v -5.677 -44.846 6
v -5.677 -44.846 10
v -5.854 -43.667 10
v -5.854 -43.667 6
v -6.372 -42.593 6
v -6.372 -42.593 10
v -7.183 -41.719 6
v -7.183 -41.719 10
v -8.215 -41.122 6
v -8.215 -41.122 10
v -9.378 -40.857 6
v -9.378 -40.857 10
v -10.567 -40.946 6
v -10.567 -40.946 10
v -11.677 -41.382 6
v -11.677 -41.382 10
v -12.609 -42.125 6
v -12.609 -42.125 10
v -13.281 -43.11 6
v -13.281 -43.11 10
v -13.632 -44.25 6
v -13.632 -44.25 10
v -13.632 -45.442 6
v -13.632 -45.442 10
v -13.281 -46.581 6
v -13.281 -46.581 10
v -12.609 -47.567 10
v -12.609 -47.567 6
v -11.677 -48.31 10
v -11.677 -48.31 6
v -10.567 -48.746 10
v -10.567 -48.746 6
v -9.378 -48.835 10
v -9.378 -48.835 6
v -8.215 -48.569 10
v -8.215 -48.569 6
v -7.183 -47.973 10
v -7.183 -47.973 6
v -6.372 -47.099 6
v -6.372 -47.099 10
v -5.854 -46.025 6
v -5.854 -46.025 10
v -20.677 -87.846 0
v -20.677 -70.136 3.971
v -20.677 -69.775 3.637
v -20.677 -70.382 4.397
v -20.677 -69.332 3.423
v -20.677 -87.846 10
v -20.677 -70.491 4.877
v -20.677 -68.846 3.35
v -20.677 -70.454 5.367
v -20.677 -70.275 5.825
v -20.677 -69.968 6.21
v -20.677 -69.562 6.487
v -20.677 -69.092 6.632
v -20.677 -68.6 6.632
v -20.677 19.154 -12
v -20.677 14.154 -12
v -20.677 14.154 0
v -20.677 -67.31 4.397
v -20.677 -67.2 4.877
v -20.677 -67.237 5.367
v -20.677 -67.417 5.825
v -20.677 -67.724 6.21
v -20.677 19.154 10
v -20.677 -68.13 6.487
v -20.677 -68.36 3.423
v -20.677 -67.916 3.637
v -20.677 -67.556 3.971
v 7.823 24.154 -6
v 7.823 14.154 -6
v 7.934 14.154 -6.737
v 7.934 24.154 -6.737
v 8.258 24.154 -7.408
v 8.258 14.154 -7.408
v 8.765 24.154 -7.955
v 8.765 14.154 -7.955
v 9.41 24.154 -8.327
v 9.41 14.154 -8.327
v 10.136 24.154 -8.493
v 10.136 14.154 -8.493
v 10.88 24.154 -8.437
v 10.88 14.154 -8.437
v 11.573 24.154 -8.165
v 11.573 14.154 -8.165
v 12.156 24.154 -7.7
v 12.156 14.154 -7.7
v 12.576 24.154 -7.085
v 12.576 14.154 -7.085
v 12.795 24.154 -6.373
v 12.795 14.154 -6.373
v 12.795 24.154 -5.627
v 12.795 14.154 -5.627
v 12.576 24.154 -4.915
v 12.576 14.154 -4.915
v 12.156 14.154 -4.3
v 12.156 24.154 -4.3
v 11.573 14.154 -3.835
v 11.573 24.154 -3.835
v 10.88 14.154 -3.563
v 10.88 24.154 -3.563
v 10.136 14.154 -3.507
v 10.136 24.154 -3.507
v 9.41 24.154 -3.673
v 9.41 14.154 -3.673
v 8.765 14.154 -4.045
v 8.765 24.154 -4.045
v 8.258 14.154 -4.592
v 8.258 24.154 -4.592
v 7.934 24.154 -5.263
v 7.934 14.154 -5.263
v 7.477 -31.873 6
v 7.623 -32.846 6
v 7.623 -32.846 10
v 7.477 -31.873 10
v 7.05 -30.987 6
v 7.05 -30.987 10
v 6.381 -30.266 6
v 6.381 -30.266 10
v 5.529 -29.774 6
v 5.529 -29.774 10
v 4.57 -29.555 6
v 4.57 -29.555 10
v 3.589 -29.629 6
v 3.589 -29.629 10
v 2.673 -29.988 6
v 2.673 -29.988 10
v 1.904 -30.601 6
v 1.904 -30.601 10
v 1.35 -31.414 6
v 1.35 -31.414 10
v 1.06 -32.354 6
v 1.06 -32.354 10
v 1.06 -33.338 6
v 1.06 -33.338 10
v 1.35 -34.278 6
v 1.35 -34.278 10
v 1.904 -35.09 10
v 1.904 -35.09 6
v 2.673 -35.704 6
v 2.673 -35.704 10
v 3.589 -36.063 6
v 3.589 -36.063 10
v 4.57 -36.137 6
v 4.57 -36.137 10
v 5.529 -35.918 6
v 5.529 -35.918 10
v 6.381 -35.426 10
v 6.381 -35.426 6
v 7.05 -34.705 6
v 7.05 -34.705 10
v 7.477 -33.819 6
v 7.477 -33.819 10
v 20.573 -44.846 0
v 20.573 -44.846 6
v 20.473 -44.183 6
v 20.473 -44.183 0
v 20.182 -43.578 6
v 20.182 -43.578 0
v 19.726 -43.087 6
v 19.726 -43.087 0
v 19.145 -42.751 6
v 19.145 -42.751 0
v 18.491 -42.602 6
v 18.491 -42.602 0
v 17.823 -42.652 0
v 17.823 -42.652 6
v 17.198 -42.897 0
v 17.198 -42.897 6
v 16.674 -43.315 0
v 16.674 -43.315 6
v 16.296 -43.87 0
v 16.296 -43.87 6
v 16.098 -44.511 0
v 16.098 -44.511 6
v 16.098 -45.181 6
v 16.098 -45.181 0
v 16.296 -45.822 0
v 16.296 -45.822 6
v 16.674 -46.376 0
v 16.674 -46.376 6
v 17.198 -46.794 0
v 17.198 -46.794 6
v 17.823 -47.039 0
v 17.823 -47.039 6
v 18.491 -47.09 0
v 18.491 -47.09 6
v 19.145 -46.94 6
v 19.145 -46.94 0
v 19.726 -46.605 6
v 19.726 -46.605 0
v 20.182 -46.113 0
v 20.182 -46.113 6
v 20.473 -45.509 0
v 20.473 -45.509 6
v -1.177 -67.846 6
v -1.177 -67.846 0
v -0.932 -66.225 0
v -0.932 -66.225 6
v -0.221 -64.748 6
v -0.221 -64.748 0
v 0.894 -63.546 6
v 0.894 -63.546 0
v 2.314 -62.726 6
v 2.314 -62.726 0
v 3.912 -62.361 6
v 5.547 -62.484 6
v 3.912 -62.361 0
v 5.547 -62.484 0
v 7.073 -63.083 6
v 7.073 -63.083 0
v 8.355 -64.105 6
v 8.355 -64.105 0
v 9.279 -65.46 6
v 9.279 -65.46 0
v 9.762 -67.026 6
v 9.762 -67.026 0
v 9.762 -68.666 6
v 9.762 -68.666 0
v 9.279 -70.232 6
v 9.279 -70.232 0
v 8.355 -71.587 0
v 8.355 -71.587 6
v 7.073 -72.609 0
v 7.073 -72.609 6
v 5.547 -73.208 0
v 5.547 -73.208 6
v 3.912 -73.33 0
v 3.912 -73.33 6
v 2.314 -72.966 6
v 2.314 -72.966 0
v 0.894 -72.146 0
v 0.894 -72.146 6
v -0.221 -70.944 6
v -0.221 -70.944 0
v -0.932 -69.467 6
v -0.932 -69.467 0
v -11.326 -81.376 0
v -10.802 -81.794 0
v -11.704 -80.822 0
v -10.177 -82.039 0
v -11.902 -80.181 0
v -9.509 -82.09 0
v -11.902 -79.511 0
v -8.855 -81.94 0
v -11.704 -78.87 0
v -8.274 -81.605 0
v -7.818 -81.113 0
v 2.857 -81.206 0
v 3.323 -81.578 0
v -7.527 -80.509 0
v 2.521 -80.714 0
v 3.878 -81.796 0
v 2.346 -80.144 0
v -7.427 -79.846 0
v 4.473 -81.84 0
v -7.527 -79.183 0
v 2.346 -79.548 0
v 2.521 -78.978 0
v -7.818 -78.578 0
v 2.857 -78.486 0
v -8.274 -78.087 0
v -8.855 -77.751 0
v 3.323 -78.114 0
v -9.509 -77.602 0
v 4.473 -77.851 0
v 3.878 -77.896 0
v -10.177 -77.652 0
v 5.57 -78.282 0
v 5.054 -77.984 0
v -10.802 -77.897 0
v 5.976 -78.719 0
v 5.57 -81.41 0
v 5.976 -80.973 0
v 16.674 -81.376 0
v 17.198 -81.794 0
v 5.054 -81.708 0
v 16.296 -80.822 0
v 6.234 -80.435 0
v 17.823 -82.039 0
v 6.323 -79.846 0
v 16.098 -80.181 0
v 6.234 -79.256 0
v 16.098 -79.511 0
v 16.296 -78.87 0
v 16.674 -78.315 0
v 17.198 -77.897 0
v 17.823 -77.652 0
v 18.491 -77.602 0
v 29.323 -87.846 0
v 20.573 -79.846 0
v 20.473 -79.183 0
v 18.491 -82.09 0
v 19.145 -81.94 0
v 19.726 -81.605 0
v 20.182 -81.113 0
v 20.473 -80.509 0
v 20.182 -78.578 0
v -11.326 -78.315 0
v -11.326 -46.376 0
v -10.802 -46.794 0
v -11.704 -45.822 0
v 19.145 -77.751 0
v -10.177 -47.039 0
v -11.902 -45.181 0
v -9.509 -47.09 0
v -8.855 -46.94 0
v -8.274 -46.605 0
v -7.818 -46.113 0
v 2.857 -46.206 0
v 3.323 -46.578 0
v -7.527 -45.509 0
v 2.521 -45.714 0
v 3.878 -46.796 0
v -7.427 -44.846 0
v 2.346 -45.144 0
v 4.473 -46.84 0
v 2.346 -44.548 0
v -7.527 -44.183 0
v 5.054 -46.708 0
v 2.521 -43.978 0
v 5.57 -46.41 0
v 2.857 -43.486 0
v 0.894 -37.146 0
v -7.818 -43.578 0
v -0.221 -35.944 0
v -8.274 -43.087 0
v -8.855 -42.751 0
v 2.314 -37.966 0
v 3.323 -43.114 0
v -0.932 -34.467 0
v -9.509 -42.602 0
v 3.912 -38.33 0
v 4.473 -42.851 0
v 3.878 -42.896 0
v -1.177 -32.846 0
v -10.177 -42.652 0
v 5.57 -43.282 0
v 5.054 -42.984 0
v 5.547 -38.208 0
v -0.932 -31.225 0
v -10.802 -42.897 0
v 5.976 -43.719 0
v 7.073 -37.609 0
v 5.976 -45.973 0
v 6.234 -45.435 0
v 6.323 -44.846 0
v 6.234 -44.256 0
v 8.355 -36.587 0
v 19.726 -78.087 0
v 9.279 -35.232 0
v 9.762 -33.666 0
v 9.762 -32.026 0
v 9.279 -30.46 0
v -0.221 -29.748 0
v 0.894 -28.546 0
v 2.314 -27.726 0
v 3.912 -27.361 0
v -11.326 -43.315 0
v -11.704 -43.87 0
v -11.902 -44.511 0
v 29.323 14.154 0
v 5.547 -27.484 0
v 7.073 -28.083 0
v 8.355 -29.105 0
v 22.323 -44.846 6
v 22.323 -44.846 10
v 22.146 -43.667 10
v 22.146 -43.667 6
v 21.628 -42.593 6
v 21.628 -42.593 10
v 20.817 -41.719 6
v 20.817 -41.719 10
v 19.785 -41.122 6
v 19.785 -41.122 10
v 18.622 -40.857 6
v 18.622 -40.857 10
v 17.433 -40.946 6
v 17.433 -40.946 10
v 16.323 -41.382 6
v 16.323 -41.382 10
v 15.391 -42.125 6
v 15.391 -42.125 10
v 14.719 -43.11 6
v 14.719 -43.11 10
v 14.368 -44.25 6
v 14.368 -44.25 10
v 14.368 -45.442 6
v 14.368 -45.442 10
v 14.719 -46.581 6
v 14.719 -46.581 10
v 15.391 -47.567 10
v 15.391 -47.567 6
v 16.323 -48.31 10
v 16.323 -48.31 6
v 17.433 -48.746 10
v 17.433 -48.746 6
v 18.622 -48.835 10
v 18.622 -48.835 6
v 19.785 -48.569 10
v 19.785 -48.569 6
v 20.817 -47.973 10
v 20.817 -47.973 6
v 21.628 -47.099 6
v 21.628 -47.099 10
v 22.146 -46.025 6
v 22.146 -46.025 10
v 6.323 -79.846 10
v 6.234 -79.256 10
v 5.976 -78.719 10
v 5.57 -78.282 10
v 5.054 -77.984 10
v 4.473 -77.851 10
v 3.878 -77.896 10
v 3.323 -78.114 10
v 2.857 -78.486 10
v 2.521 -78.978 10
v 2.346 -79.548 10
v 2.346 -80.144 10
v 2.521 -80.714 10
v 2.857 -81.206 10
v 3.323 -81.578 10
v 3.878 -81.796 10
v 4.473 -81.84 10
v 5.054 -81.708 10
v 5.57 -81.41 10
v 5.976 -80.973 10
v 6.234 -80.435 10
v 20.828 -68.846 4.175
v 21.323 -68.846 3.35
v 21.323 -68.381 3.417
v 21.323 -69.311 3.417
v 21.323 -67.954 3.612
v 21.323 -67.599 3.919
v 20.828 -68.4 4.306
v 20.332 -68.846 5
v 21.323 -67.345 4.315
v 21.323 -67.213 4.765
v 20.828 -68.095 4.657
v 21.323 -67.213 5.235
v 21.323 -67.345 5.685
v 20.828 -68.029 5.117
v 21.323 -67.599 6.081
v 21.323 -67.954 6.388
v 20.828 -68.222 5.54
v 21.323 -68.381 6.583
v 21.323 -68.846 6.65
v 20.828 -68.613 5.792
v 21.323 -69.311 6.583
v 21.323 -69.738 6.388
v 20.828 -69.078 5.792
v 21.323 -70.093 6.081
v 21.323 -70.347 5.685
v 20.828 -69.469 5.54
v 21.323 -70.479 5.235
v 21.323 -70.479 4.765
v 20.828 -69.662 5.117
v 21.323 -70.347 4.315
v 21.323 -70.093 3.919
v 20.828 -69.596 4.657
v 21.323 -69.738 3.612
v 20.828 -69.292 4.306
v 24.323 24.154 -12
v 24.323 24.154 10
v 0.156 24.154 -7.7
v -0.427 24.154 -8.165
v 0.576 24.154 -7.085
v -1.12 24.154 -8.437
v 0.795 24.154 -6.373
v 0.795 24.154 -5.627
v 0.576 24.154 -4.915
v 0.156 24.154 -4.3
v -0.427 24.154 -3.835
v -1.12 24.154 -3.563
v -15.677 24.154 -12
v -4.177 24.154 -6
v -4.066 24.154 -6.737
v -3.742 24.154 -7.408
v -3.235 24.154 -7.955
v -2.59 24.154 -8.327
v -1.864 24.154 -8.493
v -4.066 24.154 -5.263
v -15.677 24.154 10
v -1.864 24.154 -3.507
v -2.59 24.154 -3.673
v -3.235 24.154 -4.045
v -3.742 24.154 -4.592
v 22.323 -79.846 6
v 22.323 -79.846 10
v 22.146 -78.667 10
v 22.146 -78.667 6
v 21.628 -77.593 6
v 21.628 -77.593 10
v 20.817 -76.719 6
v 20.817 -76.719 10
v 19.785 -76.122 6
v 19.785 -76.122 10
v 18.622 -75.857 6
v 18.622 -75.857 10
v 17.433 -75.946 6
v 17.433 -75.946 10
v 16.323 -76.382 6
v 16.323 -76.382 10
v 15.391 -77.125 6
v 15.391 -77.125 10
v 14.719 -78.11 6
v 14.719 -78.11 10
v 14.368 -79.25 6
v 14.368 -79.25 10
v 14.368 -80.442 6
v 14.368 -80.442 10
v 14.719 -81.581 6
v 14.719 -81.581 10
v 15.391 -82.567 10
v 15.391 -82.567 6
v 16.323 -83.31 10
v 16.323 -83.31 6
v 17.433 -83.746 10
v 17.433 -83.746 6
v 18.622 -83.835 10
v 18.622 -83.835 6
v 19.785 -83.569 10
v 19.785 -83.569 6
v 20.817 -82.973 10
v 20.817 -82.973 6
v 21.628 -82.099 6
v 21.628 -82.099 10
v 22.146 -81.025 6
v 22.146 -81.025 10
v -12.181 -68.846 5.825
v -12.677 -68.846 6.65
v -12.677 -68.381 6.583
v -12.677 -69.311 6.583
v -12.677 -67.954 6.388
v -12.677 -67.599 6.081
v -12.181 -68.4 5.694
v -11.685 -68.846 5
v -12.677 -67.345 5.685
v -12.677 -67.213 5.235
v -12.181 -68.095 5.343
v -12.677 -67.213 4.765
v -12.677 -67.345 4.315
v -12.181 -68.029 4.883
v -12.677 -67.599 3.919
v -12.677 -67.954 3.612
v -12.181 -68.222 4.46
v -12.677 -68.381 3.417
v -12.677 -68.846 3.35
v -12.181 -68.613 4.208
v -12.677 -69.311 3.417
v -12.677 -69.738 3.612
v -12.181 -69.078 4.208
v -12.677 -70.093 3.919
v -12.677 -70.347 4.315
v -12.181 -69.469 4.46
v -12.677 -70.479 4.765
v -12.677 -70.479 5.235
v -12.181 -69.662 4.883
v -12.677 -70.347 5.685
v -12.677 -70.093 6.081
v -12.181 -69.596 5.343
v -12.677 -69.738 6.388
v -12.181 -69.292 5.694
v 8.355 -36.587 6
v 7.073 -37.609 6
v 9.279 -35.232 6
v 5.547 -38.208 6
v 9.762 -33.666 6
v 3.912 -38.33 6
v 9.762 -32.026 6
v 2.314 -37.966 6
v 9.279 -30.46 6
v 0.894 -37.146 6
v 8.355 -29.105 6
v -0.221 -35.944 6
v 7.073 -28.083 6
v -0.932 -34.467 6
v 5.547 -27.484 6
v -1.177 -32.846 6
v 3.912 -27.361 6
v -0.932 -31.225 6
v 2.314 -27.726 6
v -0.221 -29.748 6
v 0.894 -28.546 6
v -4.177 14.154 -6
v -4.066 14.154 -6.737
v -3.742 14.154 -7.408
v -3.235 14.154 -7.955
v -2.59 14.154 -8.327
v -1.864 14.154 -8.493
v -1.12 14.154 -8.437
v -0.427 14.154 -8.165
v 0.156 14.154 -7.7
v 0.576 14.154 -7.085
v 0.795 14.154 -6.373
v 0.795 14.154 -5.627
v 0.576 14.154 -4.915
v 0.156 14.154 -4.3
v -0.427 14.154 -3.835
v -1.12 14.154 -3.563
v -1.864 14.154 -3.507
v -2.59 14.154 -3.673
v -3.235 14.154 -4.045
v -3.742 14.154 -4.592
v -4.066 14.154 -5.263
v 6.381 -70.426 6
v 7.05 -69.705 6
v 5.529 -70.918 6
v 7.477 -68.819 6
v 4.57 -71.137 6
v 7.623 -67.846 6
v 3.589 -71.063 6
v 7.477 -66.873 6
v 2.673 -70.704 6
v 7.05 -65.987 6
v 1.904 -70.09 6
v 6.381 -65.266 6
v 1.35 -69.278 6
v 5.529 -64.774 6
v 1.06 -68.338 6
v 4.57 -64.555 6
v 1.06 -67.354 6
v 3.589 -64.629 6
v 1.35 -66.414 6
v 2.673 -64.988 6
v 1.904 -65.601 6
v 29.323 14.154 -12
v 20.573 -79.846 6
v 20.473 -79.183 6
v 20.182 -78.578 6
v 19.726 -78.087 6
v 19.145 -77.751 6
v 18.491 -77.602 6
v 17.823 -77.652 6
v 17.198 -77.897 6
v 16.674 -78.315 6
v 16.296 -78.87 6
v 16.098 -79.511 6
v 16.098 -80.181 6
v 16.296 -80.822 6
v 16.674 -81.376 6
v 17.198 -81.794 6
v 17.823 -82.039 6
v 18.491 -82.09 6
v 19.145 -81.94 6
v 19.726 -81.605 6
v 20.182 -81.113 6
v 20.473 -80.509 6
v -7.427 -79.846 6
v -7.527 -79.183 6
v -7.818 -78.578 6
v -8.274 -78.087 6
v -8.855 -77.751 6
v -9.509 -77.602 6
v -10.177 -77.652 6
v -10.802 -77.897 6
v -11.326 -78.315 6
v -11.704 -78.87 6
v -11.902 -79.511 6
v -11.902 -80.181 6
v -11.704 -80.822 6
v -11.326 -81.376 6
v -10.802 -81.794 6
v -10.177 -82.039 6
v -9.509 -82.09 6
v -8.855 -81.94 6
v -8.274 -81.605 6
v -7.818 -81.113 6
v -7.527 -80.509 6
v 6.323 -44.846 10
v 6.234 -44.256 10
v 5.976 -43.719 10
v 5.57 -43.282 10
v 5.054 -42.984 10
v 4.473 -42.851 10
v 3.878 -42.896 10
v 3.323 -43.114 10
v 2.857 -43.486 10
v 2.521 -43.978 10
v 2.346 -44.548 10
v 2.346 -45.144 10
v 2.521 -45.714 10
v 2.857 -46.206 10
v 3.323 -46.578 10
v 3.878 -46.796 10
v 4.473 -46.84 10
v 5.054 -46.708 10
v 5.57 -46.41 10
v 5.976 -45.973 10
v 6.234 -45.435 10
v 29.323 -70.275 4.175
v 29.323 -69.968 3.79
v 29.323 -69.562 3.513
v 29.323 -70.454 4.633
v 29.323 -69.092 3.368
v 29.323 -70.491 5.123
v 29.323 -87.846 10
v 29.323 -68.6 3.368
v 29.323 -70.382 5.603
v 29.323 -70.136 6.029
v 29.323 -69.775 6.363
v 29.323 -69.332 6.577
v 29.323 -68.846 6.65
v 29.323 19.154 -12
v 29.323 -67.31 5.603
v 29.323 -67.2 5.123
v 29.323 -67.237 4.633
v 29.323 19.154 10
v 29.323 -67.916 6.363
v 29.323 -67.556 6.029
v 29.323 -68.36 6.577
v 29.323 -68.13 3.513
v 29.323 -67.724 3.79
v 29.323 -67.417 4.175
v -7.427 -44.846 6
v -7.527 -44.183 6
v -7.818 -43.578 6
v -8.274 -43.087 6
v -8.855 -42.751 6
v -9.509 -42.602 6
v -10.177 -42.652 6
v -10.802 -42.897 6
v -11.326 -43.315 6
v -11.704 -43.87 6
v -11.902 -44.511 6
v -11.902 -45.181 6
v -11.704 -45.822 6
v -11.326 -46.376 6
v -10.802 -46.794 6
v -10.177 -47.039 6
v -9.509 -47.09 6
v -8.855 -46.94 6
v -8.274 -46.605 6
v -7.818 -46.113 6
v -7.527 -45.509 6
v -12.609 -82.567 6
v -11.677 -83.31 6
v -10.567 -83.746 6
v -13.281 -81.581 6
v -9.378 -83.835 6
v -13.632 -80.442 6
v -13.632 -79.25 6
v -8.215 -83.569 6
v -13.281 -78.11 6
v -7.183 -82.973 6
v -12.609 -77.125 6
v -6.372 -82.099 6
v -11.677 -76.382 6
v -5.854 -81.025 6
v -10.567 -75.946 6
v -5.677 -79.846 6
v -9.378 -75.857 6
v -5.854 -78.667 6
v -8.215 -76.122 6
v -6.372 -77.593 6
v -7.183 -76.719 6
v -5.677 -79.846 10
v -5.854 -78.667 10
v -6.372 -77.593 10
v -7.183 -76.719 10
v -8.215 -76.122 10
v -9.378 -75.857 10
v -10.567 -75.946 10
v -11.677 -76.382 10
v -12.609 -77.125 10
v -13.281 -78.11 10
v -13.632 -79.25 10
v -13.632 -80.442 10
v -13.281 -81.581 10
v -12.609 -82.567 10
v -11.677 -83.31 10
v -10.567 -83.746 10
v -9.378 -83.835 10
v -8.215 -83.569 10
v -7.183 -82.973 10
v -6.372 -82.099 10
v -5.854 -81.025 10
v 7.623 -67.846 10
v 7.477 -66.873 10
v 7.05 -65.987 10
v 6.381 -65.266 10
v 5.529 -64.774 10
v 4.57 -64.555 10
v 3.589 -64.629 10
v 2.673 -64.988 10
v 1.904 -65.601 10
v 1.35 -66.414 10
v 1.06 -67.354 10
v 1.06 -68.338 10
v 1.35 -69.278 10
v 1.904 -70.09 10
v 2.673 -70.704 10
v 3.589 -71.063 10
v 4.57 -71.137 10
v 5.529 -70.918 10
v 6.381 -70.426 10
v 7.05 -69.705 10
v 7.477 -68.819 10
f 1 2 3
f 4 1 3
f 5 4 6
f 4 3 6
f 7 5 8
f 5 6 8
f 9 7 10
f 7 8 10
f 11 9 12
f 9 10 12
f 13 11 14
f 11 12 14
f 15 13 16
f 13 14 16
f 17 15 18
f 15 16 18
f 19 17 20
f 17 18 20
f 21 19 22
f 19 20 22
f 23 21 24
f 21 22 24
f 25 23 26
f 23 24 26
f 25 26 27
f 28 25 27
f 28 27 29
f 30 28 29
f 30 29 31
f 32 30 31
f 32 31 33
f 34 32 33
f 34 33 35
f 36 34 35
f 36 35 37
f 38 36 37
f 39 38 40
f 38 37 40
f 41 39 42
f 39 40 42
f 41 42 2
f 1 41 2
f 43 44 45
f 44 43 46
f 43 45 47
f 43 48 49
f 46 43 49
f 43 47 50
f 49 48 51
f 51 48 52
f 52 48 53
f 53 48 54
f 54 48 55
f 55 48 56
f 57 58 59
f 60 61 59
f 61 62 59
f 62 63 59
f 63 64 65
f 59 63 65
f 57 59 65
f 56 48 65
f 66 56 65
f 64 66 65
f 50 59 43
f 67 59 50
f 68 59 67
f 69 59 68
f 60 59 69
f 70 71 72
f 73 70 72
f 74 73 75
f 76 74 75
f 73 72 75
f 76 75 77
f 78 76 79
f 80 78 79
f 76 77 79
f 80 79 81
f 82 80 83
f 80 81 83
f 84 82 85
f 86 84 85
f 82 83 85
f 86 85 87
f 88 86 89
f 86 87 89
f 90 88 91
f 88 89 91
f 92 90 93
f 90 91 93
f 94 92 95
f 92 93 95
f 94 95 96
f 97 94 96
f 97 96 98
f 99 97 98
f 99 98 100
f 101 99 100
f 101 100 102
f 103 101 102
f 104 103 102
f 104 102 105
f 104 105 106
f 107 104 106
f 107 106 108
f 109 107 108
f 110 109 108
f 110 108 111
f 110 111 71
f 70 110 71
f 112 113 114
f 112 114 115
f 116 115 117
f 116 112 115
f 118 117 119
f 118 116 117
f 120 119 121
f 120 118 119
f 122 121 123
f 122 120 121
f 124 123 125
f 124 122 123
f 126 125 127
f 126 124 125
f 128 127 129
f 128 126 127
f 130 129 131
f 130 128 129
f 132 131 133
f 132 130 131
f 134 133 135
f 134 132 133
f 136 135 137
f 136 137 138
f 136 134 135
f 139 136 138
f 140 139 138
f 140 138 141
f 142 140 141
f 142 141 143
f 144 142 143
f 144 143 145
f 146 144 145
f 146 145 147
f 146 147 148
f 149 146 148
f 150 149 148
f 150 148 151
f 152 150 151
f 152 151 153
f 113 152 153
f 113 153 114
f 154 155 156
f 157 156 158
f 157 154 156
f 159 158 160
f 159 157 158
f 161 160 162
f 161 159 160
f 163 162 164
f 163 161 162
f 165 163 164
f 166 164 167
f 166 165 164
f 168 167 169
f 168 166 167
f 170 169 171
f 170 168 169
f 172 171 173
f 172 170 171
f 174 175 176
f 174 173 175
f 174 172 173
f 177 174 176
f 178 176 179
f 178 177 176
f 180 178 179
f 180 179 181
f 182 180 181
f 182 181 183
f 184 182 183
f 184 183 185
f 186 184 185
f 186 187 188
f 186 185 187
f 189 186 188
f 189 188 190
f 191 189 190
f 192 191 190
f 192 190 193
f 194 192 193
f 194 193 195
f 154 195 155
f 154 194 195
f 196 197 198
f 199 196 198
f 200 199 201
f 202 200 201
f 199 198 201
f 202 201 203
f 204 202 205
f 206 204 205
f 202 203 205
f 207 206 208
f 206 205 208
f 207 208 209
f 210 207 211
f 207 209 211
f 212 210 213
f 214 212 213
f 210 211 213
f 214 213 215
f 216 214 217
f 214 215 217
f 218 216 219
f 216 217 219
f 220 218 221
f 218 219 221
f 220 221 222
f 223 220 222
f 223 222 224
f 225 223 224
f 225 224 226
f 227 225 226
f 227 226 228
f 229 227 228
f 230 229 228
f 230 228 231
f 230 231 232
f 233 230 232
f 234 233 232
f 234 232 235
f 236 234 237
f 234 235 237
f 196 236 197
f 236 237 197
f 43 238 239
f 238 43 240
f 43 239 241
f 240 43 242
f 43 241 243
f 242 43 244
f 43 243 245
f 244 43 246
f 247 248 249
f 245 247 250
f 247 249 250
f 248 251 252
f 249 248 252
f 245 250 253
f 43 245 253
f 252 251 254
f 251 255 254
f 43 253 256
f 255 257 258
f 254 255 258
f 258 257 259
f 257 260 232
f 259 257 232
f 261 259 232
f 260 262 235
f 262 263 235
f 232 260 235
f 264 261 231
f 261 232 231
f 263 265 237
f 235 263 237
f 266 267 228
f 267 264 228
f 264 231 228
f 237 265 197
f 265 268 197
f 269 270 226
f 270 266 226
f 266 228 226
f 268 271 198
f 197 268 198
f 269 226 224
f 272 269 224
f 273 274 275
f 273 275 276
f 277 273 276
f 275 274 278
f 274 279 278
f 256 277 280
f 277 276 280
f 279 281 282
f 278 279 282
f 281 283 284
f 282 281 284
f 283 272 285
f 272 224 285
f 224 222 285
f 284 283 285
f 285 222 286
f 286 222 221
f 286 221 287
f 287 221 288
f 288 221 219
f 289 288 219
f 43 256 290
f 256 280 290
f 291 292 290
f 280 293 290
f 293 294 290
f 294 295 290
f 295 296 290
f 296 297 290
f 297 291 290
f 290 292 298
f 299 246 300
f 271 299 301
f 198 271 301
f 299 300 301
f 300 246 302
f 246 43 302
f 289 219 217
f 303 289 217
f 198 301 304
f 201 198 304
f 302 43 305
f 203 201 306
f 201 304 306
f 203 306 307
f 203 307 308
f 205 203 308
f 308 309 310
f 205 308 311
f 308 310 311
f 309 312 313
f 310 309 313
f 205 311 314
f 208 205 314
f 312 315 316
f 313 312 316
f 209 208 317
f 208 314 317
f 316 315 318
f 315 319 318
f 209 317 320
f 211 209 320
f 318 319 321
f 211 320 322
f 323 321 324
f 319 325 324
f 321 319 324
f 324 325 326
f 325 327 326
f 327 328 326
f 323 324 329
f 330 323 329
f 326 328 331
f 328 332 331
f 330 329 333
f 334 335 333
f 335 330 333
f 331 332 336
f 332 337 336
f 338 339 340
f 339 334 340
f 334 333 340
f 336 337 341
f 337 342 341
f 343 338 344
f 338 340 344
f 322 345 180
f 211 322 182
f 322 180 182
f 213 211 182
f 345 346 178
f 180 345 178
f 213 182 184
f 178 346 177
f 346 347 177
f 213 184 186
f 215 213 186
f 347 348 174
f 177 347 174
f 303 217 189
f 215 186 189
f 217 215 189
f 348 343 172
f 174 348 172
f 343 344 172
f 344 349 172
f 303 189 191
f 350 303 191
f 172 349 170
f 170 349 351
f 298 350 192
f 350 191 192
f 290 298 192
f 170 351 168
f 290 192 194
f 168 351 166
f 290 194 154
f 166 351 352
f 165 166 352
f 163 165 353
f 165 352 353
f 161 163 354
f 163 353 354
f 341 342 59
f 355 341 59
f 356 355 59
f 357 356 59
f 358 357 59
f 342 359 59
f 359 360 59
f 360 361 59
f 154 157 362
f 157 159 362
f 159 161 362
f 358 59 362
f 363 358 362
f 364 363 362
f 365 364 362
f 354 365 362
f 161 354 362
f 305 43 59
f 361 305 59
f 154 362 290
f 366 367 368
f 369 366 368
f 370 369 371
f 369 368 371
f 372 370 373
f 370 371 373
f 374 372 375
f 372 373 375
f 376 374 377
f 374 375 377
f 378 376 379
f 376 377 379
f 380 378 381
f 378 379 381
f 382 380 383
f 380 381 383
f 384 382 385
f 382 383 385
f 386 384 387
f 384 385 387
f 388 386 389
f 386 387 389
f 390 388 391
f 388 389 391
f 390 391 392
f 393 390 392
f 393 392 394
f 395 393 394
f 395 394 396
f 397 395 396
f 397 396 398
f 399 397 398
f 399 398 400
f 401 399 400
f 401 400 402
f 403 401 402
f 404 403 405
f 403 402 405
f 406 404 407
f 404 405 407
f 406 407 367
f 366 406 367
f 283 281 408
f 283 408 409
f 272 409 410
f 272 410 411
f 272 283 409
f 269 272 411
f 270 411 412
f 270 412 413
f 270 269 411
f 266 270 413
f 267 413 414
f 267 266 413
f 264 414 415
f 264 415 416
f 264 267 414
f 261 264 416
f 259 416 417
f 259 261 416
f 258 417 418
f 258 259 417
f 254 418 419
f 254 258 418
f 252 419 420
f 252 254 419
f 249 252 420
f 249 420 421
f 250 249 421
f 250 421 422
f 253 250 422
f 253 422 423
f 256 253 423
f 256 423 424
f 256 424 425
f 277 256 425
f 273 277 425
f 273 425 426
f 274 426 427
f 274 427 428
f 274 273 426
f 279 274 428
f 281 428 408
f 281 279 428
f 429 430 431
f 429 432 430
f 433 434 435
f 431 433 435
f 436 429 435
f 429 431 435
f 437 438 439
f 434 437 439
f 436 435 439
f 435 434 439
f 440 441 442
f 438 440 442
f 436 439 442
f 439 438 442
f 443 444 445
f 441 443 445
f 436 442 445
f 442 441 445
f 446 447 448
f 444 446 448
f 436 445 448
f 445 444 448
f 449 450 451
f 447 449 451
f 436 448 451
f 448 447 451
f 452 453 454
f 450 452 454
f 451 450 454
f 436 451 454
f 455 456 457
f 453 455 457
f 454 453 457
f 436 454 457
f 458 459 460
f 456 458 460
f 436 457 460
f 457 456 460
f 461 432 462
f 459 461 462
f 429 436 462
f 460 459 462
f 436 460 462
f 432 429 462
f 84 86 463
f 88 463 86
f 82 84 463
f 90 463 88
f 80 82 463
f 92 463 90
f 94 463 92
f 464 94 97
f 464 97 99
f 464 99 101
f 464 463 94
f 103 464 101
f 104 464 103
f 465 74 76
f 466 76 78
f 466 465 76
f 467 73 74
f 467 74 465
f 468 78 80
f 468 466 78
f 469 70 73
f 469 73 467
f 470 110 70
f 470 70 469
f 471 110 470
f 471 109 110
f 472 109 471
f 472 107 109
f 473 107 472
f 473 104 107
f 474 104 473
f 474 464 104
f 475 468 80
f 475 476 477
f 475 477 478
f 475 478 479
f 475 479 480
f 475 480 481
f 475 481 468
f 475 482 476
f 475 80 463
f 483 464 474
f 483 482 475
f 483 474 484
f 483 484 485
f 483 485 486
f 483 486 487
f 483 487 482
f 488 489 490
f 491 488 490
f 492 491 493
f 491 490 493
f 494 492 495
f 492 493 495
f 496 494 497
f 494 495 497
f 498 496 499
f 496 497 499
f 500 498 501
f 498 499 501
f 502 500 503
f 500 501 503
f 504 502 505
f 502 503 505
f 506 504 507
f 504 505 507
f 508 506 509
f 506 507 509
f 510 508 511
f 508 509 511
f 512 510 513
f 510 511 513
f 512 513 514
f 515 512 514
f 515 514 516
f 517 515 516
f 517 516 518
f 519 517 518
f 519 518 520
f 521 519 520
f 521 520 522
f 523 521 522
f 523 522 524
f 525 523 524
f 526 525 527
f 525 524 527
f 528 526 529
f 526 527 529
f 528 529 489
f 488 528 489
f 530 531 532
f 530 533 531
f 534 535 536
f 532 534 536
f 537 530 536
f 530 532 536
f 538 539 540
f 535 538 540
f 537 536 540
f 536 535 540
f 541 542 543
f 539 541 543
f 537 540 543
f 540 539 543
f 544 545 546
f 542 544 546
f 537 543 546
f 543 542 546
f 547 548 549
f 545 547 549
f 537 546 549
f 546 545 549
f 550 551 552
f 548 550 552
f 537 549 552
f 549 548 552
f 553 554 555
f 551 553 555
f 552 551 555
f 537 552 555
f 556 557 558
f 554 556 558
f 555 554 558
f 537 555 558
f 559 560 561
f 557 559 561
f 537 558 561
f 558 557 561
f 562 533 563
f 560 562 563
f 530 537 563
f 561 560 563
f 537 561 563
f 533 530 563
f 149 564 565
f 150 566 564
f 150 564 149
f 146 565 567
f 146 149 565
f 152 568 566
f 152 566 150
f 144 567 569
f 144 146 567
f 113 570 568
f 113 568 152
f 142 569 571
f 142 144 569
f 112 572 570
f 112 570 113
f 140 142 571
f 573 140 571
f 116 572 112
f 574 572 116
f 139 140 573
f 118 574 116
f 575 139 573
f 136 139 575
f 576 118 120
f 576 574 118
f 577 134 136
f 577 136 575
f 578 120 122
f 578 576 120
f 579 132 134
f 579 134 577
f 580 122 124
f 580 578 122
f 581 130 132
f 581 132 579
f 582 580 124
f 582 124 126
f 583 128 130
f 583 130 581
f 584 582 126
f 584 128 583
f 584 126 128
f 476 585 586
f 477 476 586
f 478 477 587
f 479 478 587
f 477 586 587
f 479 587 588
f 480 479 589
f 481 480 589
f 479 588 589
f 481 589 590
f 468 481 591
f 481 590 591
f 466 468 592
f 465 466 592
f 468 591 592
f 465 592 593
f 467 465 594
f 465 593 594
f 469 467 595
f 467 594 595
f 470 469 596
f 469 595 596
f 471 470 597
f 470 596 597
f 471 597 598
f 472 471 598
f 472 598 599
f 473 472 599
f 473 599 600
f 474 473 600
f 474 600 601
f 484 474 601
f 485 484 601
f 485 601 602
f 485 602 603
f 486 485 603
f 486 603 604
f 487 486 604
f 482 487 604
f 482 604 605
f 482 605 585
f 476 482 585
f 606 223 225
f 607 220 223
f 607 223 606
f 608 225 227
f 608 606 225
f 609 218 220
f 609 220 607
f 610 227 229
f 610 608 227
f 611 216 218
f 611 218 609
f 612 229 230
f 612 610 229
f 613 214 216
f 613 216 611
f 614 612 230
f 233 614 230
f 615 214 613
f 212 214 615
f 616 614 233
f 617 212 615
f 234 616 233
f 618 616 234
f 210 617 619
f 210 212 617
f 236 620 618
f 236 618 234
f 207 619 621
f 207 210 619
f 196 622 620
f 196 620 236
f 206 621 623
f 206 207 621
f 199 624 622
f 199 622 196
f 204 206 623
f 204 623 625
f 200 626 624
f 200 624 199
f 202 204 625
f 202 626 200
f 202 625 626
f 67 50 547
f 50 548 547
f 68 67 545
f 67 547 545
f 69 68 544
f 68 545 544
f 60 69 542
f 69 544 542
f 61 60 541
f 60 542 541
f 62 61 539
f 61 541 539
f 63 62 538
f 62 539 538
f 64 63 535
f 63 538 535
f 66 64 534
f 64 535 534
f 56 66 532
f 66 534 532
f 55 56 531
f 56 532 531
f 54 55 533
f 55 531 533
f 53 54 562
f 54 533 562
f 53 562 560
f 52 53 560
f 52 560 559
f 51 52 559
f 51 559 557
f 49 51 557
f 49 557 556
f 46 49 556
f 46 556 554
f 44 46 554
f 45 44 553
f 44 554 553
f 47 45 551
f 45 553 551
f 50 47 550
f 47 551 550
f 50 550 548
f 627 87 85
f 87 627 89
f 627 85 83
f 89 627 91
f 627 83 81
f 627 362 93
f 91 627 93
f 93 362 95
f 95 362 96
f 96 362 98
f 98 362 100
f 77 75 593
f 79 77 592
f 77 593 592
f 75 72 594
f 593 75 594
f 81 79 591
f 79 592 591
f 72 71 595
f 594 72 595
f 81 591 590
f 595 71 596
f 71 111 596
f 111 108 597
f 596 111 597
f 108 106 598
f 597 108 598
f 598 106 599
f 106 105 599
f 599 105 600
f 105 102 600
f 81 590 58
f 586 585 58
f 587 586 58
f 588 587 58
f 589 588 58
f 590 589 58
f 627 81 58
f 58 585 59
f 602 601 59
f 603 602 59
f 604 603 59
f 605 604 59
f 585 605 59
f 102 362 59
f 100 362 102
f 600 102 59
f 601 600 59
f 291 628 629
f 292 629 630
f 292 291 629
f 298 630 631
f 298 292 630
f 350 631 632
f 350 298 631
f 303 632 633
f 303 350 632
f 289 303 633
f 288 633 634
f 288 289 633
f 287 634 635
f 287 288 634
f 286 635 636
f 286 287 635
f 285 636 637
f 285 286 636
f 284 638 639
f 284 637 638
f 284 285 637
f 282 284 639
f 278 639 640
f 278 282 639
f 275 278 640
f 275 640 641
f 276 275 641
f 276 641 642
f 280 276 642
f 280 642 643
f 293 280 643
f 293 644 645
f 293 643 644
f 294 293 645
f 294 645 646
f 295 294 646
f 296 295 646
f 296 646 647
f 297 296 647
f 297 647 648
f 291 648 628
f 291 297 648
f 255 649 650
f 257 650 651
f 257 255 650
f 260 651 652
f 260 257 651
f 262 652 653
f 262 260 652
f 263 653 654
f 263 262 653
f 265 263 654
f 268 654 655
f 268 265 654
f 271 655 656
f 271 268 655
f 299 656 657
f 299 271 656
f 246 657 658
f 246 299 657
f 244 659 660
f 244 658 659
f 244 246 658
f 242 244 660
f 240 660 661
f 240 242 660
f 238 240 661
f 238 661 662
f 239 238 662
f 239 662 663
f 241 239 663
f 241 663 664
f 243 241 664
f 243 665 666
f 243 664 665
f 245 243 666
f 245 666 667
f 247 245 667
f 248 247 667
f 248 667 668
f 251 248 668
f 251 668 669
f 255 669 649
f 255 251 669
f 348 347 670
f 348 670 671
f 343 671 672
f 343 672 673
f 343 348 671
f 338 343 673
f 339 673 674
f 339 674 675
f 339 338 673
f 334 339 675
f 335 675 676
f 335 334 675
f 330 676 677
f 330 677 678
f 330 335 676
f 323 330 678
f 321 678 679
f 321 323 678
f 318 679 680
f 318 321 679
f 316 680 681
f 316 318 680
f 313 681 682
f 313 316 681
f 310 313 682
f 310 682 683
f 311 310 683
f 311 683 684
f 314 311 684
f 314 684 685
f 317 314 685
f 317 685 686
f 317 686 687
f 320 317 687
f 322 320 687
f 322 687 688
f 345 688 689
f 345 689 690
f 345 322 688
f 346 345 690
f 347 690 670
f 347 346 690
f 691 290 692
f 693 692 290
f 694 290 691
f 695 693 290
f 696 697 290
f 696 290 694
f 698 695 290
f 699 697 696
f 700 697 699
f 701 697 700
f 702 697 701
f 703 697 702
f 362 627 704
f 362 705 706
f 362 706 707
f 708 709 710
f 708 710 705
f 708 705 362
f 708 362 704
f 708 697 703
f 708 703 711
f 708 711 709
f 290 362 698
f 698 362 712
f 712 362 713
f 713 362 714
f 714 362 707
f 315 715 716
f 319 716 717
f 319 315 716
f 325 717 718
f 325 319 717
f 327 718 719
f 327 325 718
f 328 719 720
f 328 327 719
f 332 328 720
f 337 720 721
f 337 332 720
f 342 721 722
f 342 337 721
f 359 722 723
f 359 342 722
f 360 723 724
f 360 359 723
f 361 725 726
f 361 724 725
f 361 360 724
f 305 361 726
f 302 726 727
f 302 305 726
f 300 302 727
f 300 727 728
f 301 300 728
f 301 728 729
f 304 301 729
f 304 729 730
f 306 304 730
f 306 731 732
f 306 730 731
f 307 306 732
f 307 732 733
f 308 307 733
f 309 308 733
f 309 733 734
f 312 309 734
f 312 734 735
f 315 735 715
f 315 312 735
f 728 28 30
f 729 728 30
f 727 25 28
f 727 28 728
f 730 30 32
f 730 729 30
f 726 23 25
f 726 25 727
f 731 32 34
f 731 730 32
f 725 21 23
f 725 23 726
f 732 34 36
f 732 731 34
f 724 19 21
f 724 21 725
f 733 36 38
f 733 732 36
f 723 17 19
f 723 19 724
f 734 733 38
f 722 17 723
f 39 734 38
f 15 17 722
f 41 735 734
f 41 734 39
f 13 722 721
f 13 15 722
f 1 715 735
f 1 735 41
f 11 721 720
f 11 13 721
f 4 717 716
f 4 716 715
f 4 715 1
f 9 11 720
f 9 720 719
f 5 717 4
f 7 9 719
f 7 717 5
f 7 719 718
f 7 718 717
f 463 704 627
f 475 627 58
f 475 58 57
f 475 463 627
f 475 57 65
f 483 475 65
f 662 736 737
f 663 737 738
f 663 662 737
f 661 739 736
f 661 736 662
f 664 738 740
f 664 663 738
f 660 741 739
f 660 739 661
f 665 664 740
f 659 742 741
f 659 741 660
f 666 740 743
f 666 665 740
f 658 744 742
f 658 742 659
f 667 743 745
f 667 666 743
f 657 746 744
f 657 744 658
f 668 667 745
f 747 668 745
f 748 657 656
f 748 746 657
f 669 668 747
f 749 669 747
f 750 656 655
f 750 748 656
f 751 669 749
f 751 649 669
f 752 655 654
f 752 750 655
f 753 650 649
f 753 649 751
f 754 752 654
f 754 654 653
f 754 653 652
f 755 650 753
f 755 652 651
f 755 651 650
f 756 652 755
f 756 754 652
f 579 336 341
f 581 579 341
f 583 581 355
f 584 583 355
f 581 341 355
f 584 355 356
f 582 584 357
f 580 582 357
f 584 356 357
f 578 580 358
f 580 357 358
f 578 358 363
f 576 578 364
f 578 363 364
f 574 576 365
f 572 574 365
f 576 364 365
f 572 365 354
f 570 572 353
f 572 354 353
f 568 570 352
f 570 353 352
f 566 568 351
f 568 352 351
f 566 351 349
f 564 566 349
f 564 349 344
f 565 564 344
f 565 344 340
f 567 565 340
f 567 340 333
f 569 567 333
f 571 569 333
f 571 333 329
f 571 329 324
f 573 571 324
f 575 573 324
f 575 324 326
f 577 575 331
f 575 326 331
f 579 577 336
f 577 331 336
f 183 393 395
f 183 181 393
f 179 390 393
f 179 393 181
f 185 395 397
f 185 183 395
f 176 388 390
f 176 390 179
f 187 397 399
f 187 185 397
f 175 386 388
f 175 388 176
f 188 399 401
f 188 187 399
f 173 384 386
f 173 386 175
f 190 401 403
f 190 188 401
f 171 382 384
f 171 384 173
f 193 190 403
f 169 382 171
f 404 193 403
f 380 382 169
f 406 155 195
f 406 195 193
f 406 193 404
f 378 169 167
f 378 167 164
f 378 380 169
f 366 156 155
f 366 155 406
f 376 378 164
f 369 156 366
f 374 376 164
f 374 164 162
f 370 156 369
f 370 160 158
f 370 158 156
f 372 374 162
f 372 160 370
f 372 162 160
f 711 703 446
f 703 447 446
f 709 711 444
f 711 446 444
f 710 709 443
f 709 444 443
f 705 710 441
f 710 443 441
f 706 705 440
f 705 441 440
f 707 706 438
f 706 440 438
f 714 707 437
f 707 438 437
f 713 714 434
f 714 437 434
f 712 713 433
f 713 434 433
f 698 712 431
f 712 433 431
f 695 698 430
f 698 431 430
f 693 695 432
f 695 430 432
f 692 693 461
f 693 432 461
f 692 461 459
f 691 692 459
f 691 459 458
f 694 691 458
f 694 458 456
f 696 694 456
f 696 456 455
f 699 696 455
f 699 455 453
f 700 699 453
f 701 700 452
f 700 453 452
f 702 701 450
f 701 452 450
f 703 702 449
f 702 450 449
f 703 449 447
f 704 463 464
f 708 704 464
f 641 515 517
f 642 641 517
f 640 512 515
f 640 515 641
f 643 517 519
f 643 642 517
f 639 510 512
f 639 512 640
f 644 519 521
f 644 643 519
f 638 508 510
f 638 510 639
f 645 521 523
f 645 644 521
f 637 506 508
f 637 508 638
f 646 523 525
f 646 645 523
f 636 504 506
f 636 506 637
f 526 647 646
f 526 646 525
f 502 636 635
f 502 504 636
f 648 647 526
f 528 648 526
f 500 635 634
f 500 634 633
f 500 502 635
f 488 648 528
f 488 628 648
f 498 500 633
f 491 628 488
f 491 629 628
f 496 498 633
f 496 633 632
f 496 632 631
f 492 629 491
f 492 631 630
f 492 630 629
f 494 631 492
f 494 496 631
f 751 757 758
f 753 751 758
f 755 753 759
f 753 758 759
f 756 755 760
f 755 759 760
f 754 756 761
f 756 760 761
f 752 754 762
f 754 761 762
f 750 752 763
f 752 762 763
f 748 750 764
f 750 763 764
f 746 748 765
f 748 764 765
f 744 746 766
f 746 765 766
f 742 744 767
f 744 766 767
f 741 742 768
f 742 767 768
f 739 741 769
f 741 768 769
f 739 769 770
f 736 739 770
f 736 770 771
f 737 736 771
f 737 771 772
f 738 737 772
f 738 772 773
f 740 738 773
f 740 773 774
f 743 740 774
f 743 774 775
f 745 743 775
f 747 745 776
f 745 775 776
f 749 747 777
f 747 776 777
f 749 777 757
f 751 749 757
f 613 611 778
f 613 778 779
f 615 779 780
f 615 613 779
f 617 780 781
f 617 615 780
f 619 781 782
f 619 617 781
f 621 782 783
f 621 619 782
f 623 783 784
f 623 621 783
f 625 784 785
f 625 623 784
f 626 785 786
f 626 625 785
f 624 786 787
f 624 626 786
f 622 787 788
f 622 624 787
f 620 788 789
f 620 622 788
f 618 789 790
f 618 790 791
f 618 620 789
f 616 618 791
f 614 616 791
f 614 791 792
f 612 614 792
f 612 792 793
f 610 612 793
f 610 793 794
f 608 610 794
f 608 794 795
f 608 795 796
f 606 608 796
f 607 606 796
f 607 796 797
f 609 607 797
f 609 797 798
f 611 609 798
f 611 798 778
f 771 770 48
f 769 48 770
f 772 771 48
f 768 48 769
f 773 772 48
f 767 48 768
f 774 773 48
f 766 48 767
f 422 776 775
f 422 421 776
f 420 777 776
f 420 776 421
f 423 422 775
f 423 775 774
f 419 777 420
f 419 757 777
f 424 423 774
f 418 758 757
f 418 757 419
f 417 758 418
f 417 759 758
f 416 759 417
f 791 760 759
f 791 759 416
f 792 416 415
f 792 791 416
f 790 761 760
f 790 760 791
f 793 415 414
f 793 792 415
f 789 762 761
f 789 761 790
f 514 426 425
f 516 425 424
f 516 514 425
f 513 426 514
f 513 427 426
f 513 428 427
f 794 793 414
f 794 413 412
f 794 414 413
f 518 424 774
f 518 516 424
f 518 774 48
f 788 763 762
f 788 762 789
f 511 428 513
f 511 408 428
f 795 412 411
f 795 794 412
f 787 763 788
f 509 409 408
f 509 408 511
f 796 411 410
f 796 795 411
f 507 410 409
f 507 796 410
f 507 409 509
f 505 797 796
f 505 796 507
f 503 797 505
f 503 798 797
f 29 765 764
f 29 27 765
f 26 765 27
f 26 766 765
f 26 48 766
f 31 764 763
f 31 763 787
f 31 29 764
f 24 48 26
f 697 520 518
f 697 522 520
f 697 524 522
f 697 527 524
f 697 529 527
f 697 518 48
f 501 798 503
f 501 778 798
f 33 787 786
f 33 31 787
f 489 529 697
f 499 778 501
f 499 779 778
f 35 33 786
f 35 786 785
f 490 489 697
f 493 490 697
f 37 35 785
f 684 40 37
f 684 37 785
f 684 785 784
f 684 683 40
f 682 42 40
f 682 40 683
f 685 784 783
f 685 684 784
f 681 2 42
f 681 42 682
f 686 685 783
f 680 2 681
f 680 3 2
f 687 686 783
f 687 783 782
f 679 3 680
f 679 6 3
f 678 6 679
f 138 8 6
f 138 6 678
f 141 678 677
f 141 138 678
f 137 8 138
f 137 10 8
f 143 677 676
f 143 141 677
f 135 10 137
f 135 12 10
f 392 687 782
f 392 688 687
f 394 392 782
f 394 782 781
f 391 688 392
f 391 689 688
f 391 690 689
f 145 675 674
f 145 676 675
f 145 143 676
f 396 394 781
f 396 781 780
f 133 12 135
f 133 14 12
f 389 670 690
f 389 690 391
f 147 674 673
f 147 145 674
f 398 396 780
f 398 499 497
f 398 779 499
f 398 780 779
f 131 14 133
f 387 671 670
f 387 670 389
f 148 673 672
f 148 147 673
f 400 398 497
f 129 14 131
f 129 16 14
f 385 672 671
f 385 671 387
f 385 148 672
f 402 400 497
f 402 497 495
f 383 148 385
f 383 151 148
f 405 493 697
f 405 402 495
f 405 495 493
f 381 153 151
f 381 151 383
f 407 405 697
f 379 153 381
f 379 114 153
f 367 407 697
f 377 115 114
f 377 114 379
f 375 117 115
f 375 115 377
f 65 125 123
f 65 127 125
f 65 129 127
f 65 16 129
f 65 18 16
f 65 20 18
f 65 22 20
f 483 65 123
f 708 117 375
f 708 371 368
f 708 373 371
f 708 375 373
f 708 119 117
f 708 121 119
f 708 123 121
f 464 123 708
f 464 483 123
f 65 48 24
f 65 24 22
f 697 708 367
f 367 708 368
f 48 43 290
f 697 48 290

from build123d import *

# Parameters (mm, degrees)
SKETCH1_W             = 50
SKETCH1_H             = 112
SKETCH1_R             = 3.3
SKETCH1_R_2           = 2
SKETCH1_R_3           = 2.25
BOSS_EXTRUDE1_DEPTH   = 10
SKETCH2_R             = 5.5
CUT_EXTRUDE1_DEPTH    = 6
SKETCH3_R             = 4
CUT_EXTRUDE2_DEPTH    = 4
SKETCH4_W             = 50
SKETCH4_H             = 10
BOSS_EXTRUDE2_DEPTH   = 12
M4_TAPPED_HOLE1_D     = 3.3
M4_TAPPED_HOLE1_DEPTH = 8
M4_TAPPED_HOLE1_TIP   = 0.991420021
M4_TAPPED_HOLE2_D     = 3.3
M4_TAPPED_HOLE2_DEPTH = 8
M4_TAPPED_HOLE2_TIP   = 0.991420021
CHAMFER1_SIZE         = 5
M6_TAPPED_HOLE1_D     = 5
M6_TAPPED_HOLE1_DEPTH = 15
M6_TAPPED_HOLE1_TIP   = 1.502151548


with BuildPart() as part:
    # Sketch1 → Boss-Extrude1 (new body)
    with BuildSketch(Plane.XY):
        with Locations((4.323308271, -31.845864662)):
            Rectangle(SKETCH1_W, SKETCH1_H)
        with Locations((4.323308271, -67.845864662)):
            Circle(SKETCH1_R, mode=Mode.SUBTRACT)
        with Locations((4.323308271, -44.845864662)):
            Circle(SKETCH1_R_2, mode=Mode.SUBTRACT)
        with Locations((4.323308271, -32.845864662)):
            Circle(SKETCH1_R, mode=Mode.SUBTRACT)
        with Locations((18.323308271, -79.845864662)):
            Circle(SKETCH1_R_3, mode=Mode.SUBTRACT)
        with Locations((-9.676691729, -79.845864662)):
            Circle(SKETCH1_R_3, mode=Mode.SUBTRACT)
        with Locations((-9.676691729, -44.845864662)):
            Circle(SKETCH1_R_3, mode=Mode.SUBTRACT)
        with Locations((18.323308271, -44.845864662)):
            Circle(SKETCH1_R_3, mode=Mode.SUBTRACT)
        with Locations((4.323308271, -79.845864662)):
            Circle(SKETCH1_R_2, mode=Mode.SUBTRACT)
    extrude(amount=BOSS_EXTRUDE1_DEPTH)

    # Sketch2 → Cut-Extrude1 (cut)
    with BuildSketch(Plane(origin=(0, 0, 0), x_dir=(-1, 0, 0), z_dir=(0, 0, -1))):
        with Locations((-4.323308271, -32.845864662)):
            Circle(SKETCH2_R)
        with Locations((-4.323308271, -67.845864662)):
            Circle(SKETCH2_R)
    extrude(amount=-CUT_EXTRUDE1_DEPTH, mode=Mode.SUBTRACT)

    # Sketch3 → Cut-Extrude2 (cut)
    with BuildSketch(Plane.XY.offset(10)):
        with Locations((-9.676691729, -44.845864662)):
            Circle(SKETCH3_R)
        with Locations((18.323308271, -44.845864662)):
            Circle(SKETCH3_R)
        with Locations((18.323308271, -79.845864662)):
            Circle(SKETCH3_R)
        with Locations((-9.676691729, -79.845864662)):
            Circle(SKETCH3_R)
    extrude(amount=-CUT_EXTRUDE2_DEPTH, mode=Mode.SUBTRACT)

    # Sketch4 → Boss-Extrude2 (add)
    with BuildSketch(Plane(origin=(0, 0, 0), x_dir=(-1, 0, 0), z_dir=(0, 0, -1))):
        with Locations((-4.323308271, 19.154135338)):
            Rectangle(SKETCH4_W, SKETCH4_H)
    extrude(amount=BOSS_EXTRUDE2_DEPTH)

    # M4 Tapped Hole1
    with Locations(Plane(origin=(29.323308271, 0, 0), x_dir=(0, 0, -1), z_dir=(1, 0, 0))):
        with Locations((-5, -68.845864662)):
            Hole(M4_TAPPED_HOLE1_D / 2, depth=M4_TAPPED_HOLE1_DEPTH)
            with Locations((0, 0, -(M4_TAPPED_HOLE1_DEPTH + M4_TAPPED_HOLE1_TIP / 2))):  # 118° drill point
                Cone(0, M4_TAPPED_HOLE1_D / 2, M4_TAPPED_HOLE1_TIP, mode=Mode.SUBTRACT)

    # M4 Tapped Hole2
    with Locations(Plane.ZY.offset(20.676691729)):
        with Locations((5, -68.845864662)):
            Hole(M4_TAPPED_HOLE2_D / 2, depth=M4_TAPPED_HOLE2_DEPTH)
            with Locations((0, 0, -(M4_TAPPED_HOLE2_DEPTH + M4_TAPPED_HOLE2_TIP / 2))):  # 118° drill point
                Cone(0, M4_TAPPED_HOLE2_D / 2, M4_TAPPED_HOLE2_TIP, mode=Mode.SUBTRACT)

    # Chamfer1
    chamfer1_edges = [part.edges().sort_by_distance(p)[0] for p in [
        (-20.676691729, 24.154135338, -1),
        (29.323308271, 24.154135338, -1),
    ]]
    chamfer(chamfer1_edges, length=CHAMFER1_SIZE)

    # M6 Tapped Hole1
    with Locations(Plane(origin=(0, 24.154135338, 0), x_dir=(1, 0, 0), z_dir=(0, 1, 0))):
        with Locations((10.323308271, 6), (-1.676691729, 6)):
            Hole(M6_TAPPED_HOLE1_D / 2, depth=M6_TAPPED_HOLE1_DEPTH)
            with Locations((0, 0, -(M6_TAPPED_HOLE1_DEPTH + M6_TAPPED_HOLE1_TIP / 2))):  # 118° drill point
                Cone(0, M6_TAPPED_HOLE1_D / 2, M6_TAPPED_HOLE1_TIP, mode=Mode.SUBTRACT)


solid = part.part
